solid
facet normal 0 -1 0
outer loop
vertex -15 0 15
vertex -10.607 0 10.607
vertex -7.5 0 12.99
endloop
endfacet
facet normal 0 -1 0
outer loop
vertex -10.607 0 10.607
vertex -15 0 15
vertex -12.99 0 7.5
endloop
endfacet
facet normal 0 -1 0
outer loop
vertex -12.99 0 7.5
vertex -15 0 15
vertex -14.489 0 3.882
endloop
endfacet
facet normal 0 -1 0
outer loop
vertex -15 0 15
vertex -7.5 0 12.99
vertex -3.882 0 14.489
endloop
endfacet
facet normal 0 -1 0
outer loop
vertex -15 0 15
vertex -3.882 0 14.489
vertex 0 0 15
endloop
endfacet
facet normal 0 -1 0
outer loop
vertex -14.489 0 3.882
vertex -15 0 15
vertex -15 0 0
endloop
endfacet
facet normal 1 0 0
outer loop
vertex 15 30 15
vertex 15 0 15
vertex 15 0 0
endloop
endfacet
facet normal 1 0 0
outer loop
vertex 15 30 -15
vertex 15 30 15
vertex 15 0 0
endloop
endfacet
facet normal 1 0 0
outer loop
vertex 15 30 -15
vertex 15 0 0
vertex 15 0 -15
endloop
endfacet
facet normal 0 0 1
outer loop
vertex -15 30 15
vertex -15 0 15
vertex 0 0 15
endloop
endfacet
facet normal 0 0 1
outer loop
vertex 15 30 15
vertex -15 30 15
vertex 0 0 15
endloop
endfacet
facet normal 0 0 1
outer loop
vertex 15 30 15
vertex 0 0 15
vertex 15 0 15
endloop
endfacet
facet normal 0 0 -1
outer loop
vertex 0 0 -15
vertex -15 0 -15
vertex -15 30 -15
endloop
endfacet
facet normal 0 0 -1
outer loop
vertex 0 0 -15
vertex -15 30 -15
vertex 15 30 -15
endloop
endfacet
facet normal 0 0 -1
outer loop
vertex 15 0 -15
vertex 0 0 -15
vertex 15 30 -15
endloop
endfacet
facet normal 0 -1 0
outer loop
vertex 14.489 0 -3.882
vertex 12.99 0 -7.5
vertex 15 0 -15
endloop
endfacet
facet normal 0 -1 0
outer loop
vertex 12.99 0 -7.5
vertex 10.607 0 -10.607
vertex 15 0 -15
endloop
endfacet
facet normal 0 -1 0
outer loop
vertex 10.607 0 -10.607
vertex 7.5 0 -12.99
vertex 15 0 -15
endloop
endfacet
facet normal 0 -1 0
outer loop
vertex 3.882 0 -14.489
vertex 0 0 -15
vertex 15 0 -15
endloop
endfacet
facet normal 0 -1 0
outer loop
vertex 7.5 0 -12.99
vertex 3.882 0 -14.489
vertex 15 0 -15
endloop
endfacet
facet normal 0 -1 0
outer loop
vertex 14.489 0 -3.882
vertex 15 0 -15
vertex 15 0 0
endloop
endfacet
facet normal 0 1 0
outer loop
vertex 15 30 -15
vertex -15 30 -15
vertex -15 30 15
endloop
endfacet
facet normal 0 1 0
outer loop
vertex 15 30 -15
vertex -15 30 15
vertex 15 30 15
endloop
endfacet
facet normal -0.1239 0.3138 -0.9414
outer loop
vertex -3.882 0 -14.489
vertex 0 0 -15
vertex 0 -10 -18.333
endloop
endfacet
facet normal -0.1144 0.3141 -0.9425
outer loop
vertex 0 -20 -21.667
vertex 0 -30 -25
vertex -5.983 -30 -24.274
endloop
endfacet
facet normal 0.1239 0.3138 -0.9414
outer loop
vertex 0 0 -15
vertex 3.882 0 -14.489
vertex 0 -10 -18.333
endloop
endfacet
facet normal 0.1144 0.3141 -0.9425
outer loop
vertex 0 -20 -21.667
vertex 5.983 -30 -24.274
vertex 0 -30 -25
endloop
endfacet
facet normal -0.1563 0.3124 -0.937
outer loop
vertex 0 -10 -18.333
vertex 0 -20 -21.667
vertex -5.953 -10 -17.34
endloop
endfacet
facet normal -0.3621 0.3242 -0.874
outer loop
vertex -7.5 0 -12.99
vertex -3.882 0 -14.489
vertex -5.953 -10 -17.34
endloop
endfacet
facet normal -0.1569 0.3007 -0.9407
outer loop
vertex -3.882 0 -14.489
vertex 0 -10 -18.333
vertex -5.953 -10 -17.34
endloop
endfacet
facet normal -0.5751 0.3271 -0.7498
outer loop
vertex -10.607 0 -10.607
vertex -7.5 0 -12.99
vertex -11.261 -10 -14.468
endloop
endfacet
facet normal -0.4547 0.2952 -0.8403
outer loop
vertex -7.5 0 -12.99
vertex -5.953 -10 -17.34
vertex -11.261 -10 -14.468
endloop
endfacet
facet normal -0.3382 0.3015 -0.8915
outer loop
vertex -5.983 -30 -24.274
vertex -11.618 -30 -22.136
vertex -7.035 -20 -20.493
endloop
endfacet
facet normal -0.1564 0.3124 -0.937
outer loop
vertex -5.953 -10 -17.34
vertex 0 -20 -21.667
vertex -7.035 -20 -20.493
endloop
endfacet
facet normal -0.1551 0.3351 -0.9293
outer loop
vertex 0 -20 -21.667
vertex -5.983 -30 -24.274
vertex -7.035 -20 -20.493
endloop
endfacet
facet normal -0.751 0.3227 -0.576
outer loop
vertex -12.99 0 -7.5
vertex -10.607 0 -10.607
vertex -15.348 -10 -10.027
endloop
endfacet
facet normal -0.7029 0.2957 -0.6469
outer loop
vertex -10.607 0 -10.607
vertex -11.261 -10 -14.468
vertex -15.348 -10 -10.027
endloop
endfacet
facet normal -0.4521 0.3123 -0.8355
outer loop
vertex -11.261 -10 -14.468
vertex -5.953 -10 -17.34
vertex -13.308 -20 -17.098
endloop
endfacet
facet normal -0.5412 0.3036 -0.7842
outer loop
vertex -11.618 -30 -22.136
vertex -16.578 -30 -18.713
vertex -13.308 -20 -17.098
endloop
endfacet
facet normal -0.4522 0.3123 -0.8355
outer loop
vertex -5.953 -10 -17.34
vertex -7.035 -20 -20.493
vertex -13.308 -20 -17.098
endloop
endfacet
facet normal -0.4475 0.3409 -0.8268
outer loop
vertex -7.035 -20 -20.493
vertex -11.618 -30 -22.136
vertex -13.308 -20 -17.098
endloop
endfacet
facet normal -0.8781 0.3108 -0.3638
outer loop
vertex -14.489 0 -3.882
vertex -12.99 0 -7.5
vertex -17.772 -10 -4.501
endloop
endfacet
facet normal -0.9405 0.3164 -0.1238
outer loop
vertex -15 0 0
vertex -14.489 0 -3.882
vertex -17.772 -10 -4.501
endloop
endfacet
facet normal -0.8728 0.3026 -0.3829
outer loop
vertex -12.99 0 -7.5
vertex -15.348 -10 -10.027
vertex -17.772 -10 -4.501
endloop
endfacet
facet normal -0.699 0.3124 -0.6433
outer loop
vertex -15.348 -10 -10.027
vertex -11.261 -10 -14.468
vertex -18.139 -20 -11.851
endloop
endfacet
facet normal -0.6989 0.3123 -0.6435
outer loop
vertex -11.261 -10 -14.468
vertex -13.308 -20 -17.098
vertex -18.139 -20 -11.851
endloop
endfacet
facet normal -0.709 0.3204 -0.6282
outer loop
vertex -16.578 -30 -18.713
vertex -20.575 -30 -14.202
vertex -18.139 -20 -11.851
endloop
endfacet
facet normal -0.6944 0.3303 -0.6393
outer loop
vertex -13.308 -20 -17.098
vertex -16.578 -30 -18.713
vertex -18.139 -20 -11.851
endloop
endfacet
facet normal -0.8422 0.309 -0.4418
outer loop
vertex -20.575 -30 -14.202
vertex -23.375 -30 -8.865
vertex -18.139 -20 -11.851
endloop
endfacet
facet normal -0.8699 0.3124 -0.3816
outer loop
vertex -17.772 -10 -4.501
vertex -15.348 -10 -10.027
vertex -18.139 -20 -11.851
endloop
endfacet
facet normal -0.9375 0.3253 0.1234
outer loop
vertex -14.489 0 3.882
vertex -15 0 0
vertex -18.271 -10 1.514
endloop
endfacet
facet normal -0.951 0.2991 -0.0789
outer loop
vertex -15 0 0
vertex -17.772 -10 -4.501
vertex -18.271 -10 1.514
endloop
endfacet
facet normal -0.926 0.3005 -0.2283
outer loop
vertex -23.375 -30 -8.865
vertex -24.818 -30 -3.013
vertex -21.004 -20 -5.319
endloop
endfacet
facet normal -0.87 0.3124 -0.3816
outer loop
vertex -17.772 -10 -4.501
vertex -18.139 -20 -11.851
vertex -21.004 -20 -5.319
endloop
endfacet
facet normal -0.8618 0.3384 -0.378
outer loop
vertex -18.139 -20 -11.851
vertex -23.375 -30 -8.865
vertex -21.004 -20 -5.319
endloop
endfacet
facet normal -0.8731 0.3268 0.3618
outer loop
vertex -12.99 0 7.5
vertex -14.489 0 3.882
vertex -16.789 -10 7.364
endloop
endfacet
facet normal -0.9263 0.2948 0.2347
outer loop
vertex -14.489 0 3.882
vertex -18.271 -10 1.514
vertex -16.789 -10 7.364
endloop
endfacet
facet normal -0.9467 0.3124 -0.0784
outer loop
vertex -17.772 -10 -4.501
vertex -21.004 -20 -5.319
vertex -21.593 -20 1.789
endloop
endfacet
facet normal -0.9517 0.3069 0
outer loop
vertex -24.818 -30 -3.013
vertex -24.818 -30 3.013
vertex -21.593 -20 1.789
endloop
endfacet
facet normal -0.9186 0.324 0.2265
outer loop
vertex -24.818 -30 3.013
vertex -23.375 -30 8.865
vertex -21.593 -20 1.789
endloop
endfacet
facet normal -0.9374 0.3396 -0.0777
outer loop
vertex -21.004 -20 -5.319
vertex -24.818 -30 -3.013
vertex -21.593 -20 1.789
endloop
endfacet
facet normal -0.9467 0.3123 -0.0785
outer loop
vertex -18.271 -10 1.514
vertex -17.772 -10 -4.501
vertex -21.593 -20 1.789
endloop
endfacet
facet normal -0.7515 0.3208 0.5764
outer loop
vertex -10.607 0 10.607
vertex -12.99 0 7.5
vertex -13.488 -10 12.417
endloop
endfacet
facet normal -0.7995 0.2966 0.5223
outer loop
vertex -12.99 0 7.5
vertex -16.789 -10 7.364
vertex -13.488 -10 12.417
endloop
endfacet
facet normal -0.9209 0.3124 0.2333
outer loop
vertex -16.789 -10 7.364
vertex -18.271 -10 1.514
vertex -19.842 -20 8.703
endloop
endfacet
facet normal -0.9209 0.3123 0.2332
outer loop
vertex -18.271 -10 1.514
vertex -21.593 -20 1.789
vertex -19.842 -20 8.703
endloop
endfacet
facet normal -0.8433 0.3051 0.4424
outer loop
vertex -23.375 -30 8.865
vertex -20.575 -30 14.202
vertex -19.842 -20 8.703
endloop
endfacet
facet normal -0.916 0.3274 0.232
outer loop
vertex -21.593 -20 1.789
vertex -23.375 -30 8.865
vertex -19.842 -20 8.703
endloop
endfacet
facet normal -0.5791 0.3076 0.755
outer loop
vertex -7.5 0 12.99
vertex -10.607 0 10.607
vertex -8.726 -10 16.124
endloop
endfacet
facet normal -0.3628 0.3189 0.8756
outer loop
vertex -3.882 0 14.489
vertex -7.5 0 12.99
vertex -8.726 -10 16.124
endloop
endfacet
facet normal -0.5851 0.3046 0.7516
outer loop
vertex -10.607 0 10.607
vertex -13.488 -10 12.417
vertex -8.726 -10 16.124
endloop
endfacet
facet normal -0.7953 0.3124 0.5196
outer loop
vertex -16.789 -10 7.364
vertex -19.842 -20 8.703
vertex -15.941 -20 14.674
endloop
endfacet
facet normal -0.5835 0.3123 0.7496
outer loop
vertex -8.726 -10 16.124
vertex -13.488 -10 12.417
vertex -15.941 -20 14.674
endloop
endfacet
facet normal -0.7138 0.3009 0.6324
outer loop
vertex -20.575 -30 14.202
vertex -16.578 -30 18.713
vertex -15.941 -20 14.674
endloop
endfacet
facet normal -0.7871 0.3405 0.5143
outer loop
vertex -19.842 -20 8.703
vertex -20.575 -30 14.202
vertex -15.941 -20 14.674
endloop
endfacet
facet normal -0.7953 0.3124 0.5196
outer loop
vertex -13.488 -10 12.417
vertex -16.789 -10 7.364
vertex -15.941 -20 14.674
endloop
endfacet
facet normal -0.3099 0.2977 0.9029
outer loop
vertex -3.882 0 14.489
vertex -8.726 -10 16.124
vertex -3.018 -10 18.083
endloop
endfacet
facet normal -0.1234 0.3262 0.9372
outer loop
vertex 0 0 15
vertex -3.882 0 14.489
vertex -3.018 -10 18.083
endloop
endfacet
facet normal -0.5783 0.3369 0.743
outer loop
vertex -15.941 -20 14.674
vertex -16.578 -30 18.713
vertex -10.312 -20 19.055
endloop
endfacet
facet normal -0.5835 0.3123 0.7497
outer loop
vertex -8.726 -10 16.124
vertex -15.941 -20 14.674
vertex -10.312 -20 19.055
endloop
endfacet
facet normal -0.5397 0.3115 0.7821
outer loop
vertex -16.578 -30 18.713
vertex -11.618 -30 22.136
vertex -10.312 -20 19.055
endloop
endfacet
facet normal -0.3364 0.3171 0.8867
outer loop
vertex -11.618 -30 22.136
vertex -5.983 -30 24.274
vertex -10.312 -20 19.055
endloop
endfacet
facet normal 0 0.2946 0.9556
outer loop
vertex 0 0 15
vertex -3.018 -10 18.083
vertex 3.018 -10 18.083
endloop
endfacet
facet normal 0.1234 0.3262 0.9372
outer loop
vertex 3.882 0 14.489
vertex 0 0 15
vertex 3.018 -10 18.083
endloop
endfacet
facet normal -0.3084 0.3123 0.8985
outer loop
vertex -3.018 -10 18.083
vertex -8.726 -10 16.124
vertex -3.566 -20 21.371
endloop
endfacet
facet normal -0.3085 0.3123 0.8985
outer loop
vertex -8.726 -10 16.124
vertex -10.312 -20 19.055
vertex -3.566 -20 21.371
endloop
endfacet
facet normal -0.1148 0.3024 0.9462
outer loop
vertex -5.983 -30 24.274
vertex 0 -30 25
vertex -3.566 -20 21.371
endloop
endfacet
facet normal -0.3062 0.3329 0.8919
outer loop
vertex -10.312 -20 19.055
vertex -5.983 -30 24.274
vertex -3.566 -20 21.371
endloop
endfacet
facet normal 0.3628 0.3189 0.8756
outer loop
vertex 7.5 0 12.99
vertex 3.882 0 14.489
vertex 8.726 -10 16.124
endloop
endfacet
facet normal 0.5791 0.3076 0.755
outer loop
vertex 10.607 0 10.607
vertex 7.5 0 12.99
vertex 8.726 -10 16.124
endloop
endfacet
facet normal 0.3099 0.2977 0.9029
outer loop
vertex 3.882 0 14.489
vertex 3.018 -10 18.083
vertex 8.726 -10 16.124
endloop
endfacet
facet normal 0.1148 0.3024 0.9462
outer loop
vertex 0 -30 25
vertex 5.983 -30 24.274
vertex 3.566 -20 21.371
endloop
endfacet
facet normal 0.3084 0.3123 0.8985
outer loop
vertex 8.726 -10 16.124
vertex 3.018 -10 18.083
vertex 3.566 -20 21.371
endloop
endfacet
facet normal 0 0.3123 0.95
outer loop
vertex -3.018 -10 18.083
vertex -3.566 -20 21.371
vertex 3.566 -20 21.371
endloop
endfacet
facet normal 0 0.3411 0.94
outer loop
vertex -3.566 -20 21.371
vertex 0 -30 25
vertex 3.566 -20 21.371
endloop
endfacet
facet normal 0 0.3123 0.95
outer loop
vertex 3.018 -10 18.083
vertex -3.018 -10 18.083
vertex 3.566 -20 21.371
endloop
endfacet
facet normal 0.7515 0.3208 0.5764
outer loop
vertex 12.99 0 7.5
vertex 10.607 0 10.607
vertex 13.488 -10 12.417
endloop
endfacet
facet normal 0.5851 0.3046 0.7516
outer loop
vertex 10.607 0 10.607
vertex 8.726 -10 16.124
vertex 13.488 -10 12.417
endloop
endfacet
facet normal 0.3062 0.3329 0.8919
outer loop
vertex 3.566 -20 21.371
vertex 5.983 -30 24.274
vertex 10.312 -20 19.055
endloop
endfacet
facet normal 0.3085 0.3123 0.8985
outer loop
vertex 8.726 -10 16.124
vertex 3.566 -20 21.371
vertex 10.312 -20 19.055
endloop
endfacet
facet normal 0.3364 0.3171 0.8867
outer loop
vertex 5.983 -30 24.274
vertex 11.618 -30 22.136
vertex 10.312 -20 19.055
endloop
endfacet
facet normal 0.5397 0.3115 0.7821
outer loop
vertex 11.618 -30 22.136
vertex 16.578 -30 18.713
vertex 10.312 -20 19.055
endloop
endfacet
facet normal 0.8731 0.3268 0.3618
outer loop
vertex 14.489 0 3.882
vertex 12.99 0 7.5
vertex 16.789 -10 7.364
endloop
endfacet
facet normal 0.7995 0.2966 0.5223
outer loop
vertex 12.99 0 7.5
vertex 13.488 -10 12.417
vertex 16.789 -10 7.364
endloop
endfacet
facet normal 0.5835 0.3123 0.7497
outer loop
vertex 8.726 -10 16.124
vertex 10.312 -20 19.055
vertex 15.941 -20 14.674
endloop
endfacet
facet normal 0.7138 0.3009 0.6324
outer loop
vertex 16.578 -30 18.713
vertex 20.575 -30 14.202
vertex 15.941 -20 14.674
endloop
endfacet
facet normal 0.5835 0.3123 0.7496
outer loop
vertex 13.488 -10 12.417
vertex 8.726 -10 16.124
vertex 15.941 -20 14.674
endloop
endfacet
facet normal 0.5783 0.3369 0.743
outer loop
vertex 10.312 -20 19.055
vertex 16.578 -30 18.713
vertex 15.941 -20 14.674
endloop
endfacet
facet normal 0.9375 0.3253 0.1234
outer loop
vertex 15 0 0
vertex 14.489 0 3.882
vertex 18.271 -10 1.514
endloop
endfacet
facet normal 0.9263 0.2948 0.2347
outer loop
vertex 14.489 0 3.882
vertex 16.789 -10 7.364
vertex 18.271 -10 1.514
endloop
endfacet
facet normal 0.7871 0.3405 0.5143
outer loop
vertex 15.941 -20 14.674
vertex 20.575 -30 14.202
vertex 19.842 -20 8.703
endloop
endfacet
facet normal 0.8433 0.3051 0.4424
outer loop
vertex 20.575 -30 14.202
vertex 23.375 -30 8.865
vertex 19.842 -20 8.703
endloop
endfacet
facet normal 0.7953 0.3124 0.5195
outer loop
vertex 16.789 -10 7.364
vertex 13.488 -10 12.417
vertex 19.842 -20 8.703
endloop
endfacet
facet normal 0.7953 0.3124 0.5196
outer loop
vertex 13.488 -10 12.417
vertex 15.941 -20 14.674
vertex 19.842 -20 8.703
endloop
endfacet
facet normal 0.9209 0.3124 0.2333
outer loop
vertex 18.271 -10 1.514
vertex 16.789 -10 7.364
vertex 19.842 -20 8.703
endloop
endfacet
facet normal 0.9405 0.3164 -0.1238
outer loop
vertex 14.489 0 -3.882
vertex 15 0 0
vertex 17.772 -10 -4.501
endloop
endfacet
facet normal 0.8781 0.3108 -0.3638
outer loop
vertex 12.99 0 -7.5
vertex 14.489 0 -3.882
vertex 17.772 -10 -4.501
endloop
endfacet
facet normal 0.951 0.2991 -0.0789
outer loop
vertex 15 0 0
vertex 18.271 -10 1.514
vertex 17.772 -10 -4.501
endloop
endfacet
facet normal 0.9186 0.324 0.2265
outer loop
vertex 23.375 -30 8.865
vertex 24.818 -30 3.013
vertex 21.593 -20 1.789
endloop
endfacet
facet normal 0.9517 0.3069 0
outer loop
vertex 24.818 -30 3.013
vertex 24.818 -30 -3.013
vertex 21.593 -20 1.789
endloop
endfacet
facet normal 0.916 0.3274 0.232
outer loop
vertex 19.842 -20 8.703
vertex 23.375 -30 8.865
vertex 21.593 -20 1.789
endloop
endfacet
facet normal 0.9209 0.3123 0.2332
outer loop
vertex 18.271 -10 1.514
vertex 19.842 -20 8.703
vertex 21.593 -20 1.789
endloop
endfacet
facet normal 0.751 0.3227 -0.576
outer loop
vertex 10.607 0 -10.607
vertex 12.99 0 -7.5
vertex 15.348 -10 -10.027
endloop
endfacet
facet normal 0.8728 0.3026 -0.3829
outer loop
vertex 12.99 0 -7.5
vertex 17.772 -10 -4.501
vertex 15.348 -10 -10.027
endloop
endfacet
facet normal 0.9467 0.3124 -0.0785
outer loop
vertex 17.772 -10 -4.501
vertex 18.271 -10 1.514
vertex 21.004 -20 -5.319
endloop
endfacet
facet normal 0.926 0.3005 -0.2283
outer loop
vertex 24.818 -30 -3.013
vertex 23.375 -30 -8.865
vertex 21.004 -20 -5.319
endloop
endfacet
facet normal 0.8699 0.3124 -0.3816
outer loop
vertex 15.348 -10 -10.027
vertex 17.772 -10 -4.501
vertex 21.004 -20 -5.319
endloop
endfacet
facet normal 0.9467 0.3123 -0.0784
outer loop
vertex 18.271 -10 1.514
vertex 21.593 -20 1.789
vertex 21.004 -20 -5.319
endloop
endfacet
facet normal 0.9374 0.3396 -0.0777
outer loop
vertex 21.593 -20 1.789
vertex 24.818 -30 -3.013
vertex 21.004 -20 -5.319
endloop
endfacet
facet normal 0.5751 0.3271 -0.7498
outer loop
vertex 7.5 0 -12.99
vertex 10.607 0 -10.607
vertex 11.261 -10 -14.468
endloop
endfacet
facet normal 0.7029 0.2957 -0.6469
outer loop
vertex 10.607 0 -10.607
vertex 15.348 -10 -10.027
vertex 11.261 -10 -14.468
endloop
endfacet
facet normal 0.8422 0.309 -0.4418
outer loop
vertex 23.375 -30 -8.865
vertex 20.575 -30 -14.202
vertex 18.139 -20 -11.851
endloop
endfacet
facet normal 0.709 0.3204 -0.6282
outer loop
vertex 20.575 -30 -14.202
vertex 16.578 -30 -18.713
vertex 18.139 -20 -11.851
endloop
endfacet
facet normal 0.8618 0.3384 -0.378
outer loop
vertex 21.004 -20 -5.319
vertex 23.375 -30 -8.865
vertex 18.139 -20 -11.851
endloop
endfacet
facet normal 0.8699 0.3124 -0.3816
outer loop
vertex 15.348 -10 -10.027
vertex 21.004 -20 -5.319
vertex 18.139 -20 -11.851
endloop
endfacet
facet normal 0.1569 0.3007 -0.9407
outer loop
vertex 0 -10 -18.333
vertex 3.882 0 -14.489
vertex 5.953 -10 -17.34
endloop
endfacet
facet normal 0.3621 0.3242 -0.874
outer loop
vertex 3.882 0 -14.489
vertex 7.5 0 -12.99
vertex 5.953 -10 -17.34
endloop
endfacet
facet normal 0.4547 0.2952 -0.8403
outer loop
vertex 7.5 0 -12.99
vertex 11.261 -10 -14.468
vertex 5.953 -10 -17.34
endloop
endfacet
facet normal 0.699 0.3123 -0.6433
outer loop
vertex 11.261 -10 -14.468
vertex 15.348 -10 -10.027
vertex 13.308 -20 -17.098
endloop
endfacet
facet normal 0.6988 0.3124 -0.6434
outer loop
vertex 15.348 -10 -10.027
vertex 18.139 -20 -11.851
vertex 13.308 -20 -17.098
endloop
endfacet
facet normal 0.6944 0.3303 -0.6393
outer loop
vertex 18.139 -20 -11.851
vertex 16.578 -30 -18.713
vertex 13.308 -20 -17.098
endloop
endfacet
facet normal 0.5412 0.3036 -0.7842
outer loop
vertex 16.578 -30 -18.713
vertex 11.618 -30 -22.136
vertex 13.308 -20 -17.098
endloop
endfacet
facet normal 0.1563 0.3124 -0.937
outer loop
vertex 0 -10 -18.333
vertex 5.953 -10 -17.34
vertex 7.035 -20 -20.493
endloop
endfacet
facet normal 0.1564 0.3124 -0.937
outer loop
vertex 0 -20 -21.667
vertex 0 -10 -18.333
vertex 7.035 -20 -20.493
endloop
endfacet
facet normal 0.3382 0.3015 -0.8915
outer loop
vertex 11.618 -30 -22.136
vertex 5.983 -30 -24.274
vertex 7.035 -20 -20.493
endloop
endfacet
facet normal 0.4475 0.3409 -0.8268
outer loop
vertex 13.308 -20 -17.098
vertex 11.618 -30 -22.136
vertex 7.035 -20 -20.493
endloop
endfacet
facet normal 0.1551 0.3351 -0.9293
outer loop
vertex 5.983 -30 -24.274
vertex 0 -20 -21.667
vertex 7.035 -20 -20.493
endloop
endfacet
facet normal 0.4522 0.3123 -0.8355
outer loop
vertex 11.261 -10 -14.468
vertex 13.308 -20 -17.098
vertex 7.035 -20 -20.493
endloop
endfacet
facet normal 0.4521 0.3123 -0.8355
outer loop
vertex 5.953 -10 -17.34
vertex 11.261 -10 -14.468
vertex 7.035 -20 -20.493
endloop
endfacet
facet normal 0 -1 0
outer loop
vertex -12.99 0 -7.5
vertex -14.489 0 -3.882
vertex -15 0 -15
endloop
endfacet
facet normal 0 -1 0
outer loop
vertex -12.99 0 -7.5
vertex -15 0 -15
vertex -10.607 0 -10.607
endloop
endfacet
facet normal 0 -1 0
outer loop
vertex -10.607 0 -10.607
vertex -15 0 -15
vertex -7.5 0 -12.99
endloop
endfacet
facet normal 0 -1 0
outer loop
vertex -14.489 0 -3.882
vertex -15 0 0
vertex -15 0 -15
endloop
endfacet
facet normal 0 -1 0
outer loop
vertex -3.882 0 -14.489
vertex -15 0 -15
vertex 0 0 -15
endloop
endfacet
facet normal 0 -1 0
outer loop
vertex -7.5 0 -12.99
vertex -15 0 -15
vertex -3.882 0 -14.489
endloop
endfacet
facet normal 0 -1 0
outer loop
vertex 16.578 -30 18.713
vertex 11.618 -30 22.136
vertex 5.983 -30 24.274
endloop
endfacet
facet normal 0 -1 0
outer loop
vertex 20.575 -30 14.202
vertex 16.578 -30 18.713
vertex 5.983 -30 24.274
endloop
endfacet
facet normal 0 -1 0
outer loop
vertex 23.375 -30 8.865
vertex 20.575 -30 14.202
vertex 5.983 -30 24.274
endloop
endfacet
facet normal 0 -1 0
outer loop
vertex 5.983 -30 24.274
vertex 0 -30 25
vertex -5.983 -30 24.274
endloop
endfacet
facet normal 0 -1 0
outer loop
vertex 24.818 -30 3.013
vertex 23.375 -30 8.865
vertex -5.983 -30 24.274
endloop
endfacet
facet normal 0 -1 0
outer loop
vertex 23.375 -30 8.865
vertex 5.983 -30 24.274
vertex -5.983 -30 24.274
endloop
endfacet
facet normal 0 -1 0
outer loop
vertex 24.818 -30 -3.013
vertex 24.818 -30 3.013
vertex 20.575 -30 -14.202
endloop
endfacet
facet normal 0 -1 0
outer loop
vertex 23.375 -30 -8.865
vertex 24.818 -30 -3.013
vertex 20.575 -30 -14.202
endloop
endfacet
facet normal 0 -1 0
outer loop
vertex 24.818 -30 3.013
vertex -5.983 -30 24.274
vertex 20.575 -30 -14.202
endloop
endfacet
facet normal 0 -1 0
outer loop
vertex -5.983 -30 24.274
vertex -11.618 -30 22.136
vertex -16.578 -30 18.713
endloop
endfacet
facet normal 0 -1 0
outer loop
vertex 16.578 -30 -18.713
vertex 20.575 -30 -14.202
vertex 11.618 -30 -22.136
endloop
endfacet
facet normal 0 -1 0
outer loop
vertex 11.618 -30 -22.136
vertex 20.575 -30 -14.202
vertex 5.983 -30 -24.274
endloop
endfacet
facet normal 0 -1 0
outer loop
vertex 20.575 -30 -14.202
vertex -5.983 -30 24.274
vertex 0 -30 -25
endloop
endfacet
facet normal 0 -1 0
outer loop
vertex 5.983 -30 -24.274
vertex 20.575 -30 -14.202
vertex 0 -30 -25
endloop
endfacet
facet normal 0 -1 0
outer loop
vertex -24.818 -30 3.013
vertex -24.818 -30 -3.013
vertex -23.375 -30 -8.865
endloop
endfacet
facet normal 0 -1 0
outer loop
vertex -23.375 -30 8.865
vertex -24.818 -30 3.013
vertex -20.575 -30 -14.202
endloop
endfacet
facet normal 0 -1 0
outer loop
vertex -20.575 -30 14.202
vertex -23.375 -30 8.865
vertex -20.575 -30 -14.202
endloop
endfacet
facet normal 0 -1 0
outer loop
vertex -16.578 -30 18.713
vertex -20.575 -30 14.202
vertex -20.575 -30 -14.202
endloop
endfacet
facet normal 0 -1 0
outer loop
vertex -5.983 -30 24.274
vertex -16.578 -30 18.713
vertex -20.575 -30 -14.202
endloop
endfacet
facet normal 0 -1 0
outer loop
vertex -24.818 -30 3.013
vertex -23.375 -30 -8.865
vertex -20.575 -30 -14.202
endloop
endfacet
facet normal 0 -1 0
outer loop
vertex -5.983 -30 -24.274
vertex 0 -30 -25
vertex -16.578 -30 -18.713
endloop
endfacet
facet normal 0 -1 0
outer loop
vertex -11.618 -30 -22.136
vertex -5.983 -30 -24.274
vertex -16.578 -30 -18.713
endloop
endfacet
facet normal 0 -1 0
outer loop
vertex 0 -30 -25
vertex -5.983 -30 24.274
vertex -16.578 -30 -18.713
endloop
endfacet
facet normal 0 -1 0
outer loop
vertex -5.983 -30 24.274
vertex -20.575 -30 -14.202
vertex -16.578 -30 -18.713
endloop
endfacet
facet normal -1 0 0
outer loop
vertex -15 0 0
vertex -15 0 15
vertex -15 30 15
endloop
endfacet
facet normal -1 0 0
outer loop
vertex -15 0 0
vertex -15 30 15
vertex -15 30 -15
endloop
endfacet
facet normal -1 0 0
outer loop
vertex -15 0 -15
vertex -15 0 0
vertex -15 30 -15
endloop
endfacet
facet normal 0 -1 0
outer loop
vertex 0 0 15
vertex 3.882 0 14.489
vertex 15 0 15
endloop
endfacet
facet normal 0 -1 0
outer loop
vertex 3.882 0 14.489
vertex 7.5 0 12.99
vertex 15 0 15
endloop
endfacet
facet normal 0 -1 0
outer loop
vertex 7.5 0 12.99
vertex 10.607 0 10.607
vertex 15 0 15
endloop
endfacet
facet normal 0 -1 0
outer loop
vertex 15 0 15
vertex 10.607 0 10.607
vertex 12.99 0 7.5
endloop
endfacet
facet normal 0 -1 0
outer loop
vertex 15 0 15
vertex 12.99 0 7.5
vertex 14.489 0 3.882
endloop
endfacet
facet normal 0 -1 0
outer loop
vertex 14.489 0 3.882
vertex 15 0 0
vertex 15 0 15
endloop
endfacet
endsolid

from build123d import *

# Parameters (mm, degrees)
SKETCH_2_W      = 30
SKETCH_2_H      = 30
EXTRUDE_1_DEPTH = 30


with BuildPart() as part:
    # 草图2 → 凸台-拉伸1 (new body)
    with BuildSketch(Plane(origin=(0, 0, 0), x_dir=(1, 0, 0), z_dir=(0, 1, 0))):
        Rectangle(SKETCH_2_W, SKETCH_2_H)
    extrude(amount=EXTRUDE_1_DEPTH)

    # 草图3 → 旋转1 (revolve)
    with BuildSketch(Plane.XY, mode=Mode.PRIVATE) as revolve_1_sk:
        Polygon((0, 0), (15, 0), (25, -30), (0, -30), align=None)
    revolve(revolve_1_sk.sketch.rotate(Axis((0, -30, 0), (0, 1, 0)), 90), axis=Axis((0, -30, 0), (0, 1, 0)))


solid = part.part
